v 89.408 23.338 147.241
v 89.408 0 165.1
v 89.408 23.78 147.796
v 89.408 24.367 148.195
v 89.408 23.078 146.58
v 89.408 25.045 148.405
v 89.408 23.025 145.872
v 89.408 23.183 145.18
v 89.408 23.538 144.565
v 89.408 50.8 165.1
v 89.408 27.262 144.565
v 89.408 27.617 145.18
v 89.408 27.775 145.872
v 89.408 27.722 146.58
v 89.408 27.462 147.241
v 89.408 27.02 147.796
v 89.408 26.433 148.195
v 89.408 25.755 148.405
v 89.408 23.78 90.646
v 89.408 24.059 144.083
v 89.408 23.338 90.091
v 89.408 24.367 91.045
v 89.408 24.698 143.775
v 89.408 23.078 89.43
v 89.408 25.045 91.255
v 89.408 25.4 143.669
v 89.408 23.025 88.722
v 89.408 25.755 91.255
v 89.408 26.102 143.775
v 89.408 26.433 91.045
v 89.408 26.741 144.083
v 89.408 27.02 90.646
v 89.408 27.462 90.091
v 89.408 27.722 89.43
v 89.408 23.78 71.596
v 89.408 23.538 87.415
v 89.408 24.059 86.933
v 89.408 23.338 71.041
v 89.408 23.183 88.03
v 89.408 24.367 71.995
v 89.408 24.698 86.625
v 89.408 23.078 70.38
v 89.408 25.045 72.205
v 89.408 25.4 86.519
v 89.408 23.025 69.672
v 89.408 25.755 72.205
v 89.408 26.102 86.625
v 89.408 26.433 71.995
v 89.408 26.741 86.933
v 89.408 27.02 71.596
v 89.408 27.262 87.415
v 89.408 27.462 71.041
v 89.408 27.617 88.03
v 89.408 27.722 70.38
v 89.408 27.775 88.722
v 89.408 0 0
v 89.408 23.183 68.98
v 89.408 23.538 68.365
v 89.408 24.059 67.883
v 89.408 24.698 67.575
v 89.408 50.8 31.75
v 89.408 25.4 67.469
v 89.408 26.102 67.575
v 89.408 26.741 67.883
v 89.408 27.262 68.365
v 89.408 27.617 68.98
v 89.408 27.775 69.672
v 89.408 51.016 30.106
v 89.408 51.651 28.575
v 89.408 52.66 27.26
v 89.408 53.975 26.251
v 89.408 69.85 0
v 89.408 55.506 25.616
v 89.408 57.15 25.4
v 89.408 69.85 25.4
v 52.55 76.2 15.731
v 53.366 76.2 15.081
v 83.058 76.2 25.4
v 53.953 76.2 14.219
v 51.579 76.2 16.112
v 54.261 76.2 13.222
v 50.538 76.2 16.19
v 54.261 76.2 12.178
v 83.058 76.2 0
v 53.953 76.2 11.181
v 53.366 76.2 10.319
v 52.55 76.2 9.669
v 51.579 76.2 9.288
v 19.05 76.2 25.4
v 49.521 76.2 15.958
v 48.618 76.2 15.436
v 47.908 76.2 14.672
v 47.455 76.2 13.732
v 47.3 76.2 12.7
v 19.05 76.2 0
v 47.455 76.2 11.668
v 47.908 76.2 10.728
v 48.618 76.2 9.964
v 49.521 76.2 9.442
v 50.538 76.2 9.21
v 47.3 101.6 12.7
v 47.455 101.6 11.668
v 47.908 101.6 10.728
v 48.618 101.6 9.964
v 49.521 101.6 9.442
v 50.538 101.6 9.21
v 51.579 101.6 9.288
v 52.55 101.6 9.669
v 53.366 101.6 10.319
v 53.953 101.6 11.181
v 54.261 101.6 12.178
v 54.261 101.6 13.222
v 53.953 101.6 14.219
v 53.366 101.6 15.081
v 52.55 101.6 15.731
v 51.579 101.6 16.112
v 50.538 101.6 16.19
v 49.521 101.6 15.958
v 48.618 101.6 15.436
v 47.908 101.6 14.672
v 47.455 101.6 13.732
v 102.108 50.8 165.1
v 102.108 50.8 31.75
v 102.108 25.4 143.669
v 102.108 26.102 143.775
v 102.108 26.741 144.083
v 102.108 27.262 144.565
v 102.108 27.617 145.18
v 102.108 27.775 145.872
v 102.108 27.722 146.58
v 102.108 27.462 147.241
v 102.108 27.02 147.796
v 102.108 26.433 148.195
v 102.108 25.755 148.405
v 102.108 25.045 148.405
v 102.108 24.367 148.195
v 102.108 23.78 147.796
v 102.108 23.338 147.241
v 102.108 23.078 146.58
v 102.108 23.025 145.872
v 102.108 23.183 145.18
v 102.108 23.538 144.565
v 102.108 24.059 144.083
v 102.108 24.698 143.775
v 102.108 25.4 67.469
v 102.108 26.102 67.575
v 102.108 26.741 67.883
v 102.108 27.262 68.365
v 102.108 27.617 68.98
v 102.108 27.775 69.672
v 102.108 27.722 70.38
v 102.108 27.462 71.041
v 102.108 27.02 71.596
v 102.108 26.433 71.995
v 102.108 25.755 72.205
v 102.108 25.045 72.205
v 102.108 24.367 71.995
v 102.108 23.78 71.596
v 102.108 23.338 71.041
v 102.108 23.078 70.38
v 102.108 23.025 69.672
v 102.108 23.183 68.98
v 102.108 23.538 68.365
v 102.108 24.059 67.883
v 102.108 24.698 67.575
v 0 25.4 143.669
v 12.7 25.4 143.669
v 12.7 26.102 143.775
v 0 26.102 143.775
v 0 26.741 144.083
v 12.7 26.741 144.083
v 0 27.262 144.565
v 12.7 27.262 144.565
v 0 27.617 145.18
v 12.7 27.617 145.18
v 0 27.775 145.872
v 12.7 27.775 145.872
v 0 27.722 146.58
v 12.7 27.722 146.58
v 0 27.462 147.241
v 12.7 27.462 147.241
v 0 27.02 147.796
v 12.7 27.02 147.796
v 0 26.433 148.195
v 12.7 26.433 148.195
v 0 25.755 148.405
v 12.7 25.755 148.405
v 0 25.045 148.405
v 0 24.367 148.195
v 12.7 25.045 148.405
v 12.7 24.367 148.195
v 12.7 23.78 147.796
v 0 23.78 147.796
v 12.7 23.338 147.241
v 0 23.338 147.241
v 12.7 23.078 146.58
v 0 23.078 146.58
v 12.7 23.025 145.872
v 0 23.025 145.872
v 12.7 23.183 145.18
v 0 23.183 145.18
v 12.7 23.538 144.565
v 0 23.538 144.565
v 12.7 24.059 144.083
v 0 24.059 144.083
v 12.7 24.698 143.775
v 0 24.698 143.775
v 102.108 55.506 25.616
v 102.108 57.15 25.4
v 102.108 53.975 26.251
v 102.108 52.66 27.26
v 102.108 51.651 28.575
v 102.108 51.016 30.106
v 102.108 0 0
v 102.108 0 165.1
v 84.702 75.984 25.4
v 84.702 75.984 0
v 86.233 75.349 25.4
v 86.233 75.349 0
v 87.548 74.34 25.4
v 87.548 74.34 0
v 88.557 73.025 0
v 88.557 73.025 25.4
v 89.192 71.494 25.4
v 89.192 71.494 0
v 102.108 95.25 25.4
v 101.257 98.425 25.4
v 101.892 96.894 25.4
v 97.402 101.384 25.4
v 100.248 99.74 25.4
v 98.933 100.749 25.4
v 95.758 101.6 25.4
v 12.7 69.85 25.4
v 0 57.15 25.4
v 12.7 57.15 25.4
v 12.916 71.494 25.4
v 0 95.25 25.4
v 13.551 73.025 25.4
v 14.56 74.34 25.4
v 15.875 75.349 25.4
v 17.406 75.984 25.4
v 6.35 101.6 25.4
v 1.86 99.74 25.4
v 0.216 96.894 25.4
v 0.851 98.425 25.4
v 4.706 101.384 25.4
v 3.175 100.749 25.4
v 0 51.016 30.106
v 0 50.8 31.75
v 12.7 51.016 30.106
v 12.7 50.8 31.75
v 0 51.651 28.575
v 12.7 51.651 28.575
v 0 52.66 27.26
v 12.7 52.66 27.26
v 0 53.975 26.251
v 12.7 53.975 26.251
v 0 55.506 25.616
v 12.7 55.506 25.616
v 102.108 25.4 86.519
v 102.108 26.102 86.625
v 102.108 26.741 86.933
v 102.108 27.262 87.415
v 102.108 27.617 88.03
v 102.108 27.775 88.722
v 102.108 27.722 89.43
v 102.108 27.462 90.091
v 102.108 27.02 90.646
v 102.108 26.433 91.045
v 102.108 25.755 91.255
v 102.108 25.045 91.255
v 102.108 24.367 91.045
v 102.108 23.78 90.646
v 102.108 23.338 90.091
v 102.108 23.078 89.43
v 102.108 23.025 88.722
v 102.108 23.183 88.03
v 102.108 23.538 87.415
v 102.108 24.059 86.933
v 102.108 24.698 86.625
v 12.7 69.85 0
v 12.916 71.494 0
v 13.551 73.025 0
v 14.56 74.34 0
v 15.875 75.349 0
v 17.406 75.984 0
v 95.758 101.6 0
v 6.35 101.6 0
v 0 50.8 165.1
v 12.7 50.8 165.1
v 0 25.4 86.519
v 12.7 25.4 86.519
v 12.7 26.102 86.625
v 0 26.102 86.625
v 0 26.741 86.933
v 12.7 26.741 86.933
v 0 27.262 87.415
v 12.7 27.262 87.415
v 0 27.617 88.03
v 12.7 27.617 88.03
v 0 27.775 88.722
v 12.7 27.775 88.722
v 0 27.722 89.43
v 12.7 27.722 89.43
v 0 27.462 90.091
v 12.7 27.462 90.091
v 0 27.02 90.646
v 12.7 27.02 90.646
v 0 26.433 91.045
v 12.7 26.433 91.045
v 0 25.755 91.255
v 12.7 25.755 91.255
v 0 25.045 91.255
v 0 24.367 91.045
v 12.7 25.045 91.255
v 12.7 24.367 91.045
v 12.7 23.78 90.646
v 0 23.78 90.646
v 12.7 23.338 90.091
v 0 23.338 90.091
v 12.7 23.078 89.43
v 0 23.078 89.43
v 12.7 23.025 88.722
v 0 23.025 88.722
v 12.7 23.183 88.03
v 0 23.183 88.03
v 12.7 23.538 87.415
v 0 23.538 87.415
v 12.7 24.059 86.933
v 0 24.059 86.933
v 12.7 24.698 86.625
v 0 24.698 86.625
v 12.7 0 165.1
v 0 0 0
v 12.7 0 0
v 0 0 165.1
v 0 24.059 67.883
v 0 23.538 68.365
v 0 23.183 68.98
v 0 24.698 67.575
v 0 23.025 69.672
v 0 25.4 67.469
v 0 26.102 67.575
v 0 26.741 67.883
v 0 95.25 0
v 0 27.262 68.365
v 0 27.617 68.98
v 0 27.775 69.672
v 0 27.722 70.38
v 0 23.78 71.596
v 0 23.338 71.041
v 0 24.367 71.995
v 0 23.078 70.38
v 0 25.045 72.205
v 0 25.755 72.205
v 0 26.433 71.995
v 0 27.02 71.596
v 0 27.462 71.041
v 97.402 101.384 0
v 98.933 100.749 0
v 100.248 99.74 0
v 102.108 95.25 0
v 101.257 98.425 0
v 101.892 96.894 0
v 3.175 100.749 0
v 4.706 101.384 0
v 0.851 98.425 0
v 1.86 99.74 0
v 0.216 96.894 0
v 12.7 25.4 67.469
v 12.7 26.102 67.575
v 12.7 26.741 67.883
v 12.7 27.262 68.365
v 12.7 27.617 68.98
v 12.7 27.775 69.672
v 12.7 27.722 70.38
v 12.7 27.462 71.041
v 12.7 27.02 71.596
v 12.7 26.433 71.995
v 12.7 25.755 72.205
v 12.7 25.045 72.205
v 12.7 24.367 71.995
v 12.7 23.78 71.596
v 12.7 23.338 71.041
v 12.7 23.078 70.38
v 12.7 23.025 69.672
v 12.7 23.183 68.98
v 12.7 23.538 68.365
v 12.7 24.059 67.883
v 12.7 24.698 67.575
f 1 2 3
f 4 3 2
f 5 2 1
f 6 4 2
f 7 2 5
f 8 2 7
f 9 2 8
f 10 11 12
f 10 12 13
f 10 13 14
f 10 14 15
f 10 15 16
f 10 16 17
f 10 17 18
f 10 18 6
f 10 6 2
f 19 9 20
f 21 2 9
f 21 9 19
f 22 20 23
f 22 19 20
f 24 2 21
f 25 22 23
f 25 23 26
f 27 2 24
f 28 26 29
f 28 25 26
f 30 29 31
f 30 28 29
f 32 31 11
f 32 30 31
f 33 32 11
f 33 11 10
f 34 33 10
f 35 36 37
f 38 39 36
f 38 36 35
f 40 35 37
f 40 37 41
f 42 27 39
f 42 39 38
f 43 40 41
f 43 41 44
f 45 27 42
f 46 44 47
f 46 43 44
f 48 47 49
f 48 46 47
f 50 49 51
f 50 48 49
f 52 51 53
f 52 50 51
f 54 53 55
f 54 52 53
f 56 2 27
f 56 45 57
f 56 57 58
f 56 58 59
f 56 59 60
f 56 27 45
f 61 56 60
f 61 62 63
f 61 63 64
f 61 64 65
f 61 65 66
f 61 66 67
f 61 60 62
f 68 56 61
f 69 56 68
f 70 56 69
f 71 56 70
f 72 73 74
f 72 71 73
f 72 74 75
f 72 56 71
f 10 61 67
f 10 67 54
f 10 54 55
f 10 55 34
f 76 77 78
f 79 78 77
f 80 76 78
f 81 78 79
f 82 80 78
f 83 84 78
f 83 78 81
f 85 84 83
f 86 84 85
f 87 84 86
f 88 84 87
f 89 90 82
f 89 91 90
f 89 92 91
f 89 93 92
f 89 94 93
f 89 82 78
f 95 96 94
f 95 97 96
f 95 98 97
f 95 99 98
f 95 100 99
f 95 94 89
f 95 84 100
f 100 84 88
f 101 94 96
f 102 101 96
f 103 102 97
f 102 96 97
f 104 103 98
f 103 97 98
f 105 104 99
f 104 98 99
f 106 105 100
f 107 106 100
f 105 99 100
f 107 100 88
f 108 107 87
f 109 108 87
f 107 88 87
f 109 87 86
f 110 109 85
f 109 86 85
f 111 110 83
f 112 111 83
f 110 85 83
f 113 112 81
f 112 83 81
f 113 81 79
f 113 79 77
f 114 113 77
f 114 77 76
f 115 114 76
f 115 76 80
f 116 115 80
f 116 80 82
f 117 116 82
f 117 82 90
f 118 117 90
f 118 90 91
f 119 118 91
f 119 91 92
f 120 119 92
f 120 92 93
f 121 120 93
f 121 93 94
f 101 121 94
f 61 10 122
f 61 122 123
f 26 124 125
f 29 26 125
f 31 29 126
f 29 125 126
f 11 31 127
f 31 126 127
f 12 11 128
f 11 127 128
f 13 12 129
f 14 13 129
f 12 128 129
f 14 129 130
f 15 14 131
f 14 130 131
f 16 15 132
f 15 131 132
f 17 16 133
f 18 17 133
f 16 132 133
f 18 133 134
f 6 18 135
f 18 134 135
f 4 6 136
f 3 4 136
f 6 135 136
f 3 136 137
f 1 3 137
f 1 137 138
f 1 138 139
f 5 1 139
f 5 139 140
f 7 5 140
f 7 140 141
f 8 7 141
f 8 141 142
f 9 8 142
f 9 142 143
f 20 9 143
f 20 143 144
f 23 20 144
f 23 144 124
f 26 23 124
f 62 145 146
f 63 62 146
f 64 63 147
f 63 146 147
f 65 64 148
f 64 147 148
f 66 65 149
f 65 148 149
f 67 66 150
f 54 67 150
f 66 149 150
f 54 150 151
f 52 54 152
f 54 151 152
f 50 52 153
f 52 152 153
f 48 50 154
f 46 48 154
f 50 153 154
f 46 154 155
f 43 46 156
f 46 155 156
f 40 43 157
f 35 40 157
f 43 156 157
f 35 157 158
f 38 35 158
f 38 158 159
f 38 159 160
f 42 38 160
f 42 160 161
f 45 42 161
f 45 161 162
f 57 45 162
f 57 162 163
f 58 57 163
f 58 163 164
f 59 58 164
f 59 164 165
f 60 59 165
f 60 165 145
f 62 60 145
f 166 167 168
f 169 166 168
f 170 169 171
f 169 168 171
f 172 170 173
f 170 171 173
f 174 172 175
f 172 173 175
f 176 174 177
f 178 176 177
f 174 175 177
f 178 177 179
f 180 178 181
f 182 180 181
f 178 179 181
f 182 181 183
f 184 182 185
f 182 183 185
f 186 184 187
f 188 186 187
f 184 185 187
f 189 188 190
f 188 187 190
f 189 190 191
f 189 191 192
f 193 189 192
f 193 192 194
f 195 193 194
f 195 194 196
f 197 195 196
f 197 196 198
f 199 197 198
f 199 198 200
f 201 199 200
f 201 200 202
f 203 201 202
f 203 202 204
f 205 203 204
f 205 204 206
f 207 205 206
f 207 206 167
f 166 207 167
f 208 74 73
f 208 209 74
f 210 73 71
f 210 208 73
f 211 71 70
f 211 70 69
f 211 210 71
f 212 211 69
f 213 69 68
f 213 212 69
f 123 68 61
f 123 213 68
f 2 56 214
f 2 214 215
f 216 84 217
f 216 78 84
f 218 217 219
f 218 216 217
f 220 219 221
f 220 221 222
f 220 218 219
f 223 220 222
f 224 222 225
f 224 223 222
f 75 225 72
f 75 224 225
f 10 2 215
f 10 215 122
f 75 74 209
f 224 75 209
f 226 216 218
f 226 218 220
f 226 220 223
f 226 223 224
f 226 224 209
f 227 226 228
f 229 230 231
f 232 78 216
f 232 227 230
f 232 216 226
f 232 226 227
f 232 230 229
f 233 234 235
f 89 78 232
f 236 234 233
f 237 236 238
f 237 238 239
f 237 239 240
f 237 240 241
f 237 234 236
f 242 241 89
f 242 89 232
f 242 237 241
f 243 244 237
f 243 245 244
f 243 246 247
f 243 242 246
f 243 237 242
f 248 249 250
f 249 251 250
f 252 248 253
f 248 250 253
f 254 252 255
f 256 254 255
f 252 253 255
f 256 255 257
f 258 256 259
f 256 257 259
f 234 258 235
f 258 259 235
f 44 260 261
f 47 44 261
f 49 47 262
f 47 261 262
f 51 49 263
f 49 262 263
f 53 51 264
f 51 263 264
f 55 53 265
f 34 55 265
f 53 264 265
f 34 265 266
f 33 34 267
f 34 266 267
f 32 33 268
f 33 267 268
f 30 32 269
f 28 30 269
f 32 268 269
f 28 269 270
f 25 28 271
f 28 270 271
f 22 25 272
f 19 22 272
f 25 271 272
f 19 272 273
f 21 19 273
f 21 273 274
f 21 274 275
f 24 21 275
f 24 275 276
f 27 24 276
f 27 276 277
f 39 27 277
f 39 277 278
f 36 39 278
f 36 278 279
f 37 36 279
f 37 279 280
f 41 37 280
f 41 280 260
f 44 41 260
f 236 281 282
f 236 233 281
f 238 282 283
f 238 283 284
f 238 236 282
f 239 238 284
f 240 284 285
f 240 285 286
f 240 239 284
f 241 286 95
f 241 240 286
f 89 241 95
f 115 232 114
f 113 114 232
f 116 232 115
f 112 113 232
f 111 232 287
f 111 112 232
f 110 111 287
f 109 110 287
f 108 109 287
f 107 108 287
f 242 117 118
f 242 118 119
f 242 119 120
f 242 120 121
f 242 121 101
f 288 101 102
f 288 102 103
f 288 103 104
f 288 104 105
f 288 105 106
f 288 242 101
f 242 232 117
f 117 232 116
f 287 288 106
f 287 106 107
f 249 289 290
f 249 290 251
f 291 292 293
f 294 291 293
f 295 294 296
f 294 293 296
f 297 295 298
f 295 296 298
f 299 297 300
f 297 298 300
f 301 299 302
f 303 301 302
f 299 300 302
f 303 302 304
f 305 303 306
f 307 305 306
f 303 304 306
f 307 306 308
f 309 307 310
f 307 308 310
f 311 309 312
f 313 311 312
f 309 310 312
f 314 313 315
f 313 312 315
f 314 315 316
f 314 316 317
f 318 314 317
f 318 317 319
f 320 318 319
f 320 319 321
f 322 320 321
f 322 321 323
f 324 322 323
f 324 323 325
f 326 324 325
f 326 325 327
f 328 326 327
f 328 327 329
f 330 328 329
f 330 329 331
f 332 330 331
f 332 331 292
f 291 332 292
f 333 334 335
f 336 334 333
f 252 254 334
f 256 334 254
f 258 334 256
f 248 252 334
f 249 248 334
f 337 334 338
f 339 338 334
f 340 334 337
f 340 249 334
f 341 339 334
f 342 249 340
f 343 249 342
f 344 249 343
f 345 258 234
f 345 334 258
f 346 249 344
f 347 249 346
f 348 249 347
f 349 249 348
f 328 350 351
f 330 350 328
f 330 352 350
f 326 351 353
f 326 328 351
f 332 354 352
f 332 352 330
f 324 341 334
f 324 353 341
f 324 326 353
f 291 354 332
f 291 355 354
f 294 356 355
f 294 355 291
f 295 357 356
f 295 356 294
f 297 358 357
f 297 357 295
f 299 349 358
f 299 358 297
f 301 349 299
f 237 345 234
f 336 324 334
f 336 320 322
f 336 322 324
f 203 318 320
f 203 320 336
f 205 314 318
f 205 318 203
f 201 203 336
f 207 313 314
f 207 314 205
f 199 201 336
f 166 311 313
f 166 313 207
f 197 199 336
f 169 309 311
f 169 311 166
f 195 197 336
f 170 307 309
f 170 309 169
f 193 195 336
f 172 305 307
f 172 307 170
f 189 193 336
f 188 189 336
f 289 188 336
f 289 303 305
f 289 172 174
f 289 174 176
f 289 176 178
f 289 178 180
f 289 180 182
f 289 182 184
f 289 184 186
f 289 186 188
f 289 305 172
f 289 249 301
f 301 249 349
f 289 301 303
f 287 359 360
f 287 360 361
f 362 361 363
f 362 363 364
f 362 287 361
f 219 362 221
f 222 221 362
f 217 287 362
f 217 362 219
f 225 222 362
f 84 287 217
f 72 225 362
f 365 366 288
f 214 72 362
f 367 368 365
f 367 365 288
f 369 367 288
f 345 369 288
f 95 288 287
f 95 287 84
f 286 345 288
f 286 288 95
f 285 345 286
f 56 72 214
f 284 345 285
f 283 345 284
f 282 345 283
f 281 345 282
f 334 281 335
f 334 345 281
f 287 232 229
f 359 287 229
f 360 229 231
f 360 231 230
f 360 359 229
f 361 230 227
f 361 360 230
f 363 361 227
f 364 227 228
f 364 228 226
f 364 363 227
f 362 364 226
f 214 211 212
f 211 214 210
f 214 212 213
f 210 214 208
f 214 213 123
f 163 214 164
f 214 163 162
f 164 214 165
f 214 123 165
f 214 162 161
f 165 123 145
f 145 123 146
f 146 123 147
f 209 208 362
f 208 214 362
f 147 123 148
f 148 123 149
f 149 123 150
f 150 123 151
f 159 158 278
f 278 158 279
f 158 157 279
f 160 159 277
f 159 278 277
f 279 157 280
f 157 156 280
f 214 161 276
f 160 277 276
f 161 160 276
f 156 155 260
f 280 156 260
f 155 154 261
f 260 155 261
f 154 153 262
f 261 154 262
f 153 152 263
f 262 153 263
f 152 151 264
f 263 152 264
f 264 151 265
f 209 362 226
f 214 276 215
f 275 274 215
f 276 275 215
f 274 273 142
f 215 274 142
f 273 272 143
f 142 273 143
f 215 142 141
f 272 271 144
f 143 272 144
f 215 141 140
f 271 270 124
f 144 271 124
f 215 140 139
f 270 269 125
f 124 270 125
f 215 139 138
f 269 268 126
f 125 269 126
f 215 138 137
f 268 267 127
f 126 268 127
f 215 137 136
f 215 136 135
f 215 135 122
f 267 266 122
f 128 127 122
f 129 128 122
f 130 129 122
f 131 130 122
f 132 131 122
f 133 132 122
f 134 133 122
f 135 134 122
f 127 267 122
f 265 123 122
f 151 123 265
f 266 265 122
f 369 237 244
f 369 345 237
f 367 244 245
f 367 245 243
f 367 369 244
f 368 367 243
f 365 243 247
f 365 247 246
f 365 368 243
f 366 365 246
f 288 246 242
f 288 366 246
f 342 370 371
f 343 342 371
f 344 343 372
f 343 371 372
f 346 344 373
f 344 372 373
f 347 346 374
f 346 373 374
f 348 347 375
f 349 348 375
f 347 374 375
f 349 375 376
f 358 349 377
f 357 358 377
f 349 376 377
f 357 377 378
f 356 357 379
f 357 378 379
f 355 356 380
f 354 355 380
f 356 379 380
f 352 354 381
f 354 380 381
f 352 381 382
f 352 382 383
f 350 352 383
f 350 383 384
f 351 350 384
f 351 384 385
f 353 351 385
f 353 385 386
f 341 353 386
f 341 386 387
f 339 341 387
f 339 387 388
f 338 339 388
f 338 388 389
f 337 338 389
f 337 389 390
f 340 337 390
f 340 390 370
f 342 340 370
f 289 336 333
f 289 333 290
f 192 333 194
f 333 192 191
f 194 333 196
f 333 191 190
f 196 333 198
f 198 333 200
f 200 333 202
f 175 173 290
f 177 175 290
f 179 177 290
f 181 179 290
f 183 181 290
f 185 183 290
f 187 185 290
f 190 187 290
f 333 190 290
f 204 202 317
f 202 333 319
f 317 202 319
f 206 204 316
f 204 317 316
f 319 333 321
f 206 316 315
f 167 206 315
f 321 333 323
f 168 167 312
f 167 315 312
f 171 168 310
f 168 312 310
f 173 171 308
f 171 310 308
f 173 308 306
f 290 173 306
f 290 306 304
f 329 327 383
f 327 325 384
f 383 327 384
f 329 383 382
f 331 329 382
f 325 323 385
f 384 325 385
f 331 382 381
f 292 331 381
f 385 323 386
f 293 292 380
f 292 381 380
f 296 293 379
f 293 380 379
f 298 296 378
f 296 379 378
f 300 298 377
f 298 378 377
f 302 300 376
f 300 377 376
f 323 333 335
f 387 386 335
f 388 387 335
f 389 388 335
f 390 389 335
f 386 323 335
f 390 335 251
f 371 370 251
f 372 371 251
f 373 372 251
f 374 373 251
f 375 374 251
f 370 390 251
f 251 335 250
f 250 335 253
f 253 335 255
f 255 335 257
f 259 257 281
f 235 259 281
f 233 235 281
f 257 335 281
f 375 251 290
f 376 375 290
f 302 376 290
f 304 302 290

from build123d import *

# Parameters (mm, degrees)
BOSS_EXTRUDE1_DEPTH   = 102.108
SKETCH2_W             = 76.708
SKETCH2_H             = 76.2
CUT_EXTRUDE1_DEPTH    = 220.104116036
F_7_0MM_DOWEL_HOLE1_D = 7
FILLET1_R             = 6.35
SKETCH5_R             = 2.38125
CUT_EXTRUDE2_DEPTH    = 220.104116036


with BuildPart() as part:
    # Sketch1 → Boss-Extrude1 (new body)
    with BuildSketch(Plane(origin=(0, 0, 0), x_dir=(0, 0, -1), z_dir=(1, 0, 0))):
        Polygon((0, 0), (-165.1, 0), (-165.1, 50.8), (-25.4, 50.8), (-25.4, 101.6), (0, 101.6), align=None)
    extrude(amount=BOSS_EXTRUDE1_DEPTH)

    # Sketch2 → Cut-Extrude1 (cut, through all)
    with BuildSketch(Plane(origin=(0, 0, 0), x_dir=(-1, 0, 0), z_dir=(0, 0, -1))):
        with Locations((-51.054, 38.1)):
            Rectangle(SKETCH2_W, SKETCH2_H)
    extrude(amount=-CUT_EXTRUDE1_DEPTH, mode=Mode.SUBTRACT)

    # Ø7.0mm Dowel Hole1 (through all)
    with Locations(Plane(origin=(0, 101.6, 0), x_dir=(1, 0, 0), z_dir=(0, 1, 0))):
        with Locations((50.8, -12.7)):
            Hole(F_7_0MM_DOWEL_HOLE1_D / 2)

    # Fillet1
    fillet1_edges = [part.edges().sort_by_distance(p)[0] for p in [
        (95.758, 50.8, 25.4),
        (6.35, 50.8, 25.4),
        (89.408, 76.2, 12.7),
        (12.7, 76.2, 12.7),
        (0, 101.6, 12.7),
        (102.108, 101.6, 12.7),
    ]]
    fillet(fillet1_edges, radius=FILLET1_R)

    # Sketch5 → Cut-Extrude2 (cut, through all)
    with BuildSketch(Plane(origin=(102.108, 0, 0), x_dir=(0, 0, -1), z_dir=(1, 0, 0))):
        with Locations((-146.05, 25.4)):
            Circle(SKETCH5_R)
        with Locations((-88.9, 25.4)):
            Circle(SKETCH5_R)
        with Locations((-69.85, 25.4)):
            Circle(SKETCH5_R)
    extrude(amount=-CUT_EXTRUDE2_DEPTH, mode=Mode.SUBTRACT)


solid = part.part
